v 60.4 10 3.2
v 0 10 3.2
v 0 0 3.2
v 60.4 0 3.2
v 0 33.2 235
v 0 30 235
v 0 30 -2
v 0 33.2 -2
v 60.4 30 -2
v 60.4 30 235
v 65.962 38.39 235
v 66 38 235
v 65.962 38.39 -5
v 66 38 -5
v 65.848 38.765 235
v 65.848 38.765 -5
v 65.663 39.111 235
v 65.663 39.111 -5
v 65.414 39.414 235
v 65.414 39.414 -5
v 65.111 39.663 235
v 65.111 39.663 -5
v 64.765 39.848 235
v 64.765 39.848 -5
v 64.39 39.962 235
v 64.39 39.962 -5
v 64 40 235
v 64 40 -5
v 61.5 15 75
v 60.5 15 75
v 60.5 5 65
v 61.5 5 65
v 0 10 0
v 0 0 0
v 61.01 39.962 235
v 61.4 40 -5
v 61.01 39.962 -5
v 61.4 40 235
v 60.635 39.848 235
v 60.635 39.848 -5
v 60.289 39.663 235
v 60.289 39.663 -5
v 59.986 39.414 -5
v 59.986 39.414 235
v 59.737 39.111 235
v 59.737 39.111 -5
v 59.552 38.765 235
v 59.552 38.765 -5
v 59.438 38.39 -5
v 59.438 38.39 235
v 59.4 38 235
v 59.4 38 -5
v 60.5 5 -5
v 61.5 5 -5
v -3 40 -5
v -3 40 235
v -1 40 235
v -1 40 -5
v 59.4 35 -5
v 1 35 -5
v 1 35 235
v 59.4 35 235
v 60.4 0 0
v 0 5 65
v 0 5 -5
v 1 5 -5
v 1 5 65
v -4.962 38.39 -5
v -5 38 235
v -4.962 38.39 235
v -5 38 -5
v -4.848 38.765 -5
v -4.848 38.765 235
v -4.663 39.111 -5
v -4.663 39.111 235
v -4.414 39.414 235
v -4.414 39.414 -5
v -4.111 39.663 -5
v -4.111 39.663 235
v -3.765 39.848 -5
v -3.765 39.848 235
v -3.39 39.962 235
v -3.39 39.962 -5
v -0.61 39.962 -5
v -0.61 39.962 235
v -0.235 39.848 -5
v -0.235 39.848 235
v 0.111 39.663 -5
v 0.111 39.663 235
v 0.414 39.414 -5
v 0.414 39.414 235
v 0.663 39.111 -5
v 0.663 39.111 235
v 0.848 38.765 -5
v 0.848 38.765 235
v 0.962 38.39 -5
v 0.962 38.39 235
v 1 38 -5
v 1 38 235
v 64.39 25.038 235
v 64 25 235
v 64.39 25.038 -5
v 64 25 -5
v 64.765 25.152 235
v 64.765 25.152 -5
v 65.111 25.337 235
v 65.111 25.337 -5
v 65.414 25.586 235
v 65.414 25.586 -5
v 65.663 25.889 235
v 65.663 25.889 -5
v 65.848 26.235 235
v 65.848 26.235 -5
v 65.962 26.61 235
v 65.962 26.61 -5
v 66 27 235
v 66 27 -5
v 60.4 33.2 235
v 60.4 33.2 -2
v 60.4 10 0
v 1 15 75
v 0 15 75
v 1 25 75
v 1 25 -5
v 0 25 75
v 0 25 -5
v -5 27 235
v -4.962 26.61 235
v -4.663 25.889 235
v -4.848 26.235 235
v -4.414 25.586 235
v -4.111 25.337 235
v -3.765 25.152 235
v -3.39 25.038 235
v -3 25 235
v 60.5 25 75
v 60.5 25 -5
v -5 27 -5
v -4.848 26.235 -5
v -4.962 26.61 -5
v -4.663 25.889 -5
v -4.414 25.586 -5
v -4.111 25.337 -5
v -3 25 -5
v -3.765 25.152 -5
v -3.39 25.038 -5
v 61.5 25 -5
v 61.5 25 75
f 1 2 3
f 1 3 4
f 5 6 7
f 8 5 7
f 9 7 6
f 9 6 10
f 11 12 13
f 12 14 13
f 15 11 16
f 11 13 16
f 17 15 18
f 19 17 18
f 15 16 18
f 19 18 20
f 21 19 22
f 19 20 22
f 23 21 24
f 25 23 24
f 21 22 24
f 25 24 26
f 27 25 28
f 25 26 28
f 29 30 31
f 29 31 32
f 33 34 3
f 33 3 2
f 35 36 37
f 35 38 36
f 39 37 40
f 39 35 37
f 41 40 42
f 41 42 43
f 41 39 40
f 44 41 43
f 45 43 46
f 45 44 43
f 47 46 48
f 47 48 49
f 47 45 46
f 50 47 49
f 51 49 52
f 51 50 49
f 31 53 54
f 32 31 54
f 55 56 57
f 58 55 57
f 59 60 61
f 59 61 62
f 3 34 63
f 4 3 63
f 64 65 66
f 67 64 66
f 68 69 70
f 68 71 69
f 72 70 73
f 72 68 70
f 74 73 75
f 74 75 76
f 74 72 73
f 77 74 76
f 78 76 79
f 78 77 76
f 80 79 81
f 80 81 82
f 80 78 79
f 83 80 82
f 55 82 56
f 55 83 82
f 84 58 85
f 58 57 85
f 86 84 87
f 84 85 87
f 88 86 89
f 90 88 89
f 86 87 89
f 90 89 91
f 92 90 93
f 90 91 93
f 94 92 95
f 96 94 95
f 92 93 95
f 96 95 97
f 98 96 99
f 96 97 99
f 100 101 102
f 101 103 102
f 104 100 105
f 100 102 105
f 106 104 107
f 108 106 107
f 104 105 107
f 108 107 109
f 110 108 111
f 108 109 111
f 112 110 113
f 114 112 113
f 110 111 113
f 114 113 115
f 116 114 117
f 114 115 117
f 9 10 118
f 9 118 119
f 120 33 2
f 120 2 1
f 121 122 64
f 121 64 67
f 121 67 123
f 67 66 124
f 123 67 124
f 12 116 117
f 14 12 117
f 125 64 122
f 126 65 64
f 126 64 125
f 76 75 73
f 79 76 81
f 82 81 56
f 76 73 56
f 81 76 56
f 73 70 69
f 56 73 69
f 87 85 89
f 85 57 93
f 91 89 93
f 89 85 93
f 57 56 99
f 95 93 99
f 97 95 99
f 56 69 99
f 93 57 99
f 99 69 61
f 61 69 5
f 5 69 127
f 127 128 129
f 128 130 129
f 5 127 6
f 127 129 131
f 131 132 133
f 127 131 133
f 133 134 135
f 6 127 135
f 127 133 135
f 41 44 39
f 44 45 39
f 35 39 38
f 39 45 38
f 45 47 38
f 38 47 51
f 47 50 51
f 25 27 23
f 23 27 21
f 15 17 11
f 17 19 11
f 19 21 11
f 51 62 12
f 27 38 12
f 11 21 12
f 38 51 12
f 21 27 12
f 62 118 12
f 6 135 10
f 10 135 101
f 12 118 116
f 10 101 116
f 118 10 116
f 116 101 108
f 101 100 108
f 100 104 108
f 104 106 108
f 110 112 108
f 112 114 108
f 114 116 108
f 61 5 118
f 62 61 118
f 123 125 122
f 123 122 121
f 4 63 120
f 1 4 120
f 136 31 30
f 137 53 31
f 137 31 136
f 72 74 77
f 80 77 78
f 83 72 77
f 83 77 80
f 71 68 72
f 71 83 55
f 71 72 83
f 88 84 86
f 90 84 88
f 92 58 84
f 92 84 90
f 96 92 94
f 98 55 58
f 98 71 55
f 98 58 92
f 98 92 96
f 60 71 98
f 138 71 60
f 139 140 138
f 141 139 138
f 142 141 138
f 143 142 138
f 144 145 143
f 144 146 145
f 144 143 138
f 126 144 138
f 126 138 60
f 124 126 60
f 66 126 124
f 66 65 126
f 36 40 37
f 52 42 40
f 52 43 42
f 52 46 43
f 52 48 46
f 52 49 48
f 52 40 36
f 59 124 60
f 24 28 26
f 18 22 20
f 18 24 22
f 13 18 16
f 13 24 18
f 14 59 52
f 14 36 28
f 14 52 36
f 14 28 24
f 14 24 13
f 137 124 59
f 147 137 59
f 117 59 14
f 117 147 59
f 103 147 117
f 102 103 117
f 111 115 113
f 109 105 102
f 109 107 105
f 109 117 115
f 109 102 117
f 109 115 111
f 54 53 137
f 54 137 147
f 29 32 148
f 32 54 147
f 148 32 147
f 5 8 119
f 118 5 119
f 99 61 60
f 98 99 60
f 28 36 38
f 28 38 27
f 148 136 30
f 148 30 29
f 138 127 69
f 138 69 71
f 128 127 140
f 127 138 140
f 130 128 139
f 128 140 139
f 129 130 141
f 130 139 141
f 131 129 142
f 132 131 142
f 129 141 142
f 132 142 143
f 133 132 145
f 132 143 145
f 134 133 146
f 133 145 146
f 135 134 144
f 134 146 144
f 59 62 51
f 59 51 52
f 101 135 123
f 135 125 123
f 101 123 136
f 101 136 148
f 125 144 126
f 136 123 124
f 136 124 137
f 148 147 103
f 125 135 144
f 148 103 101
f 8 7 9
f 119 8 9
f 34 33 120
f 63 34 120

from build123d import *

# Parameters (mm, degrees)
BOX_W                  = 60.4
BOX_H                  = 10
BOX_DEPTH              = 3.2
BOX003_W               = 60.4
BOX003_H               = 250
BOX003_DEPTH           = 3.2
BOX001_W               = 60.4
BOX001_H               = 250
BOX001_DEPTH           = 3.2
BOX004_W               = 58.4
BOX004_H               = 250
BOX004_DEPTH           = 13.2
BOX005_W               = 58.4
BOX005_H               = 250
BOX005_DEPTH           = 13.2
BOX002_W               = 71
BOX002_H               = 240
BOX002_DEPTH           = 15
CUT001_PLACEMENT_ANGLE = 270
BOX006_W               = 1
BOX006_H               = 20
BOX006_DEPTH           = 80
BOX007_W               = 1
BOX007_H               = 20
BOX007_DEPTH           = 80
FILLET_R               = 2
CHAMFER_SIZE           = 10


with BuildPart() as single_magnet:
    # Box → Box (new body)
    with BuildSketch(Plane.XY):
        with Locations((30.2, 5)):
            Rectangle(BOX_W, BOX_H)
    extrude(amount=BOX_DEPTH)


with BuildPart() as f_25_single_magnets001:
    # Box003 → Box003 (new body)
    with BuildSketch(Plane.XY):
        with Locations((30.2, 125)):
            Rectangle(BOX003_W, BOX003_H)
    extrude(amount=BOX003_DEPTH)


with BuildPart() as magnet_cutout:
    # Box001 → Box001 (new body)
    with BuildSketch(Plane(origin=(0, -5, 0), x_dir=(1, 0, 0), z_dir=(0, 0, 1))):
        with Locations((30.2, 125)):
            Rectangle(BOX001_W, BOX001_H)
    extrude(amount=BOX001_DEPTH)

    # Fusion: union 25-Single-Magnets001
    add(f_25_single_magnets001.part)


with BuildPart() as magnet_cutout_1:
    # Fusion placement: moved
    add(magnet_cutout.part.moved(Location((0, -18, 0))))


with BuildPart() as f_25_single_magnets002:
    # Box004 → Box004 (new body)
    with BuildSketch(Plane(origin=(1, 7, 0), x_dir=(1, 0, 0), z_dir=(0, 0, 1))):
        with Locations((29.2, 125)):
            Rectangle(BOX004_W, BOX004_H)
    extrude(amount=BOX004_DEPTH)


with BuildPart() as slide_cutout:
    # Box005 → Box005 (new body)
    with BuildSketch(Plane(origin=(1, -9, 0), x_dir=(1, 0, 0), z_dir=(0, 0, 1))):
        with Locations((29.2, 125)):
            Rectangle(BOX005_W, BOX005_H)
    extrude(amount=BOX005_DEPTH)

    # Fusion001: union 25-Single-Magnets002
    add(f_25_single_magnets002.part)


with BuildPart() as slide_cutout_1:
    # Fusion001 placement: moved
    add(slide_cutout.part.moved(Location((0, 0, 5))))


with BuildPart() as slide_v1:
    # Box002 → Box002 (new body)
    with BuildSketch(Plane(origin=(-5, -5, -5), x_dir=(1, 0, 0), z_dir=(0, 0, 1))):
        with Locations((35.5, 120)):
            Rectangle(BOX002_W, BOX002_H)
    extrude(amount=BOX002_DEPTH)

    # Cut: cut Slide-Cutout
    add(slide_cutout_1.part, mode=Mode.SUBTRACT)

    # Cut001: cut Magnet-Cutout
    add(magnet_cutout_1.part, mode=Mode.SUBTRACT)


with BuildPart() as slide_v1_1:
    # Cut001 placement: moved
    add(slide_v1.part.moved(Location((0, 30, 230))).rotate(Axis((0, 30, 230), (1, 0, 0)), CUT001_PLACEMENT_ANGLE))


with BuildPart() as support:
    # Box006 → Box006 (new body)
    with BuildSketch(Plane(origin=(0, 5, -5), x_dir=(1, 0, 0), z_dir=(0, 0, 1))):
        with Locations((0.5, 10)):
            Rectangle(BOX006_W, BOX006_H)
    extrude(amount=BOX006_DEPTH)


with BuildPart() as chamfer_body:
    # Box007 → Box007 (new body)
    with BuildSketch(Plane(origin=(60.5, 5, -5), x_dir=(1, 0, 0), z_dir=(0, 0, 1))):
        with Locations((0.5, 10)):
            Rectangle(BOX007_W, BOX007_H)
    extrude(amount=BOX007_DEPTH)

    # Fusion002: union Slide-V1, Support
    add(slide_v1_1.part)
    add(support.part)

    # Fillet
    fillet_edges = [chamfer_body.edges().sort_by_distance(p)[0] for p in [
        (-5, 40, 115),
        (-5, 25, 115),
        (1, 40, 109),
        (1, 40, 229),
        (66, 25, 115),
        (66, 40, 115),
        (59.4, 40, 229),
        (59.4, 40, 109),
    ]]
    fillet(fillet_edges, radius=FILLET_R)

    # Chamfer
    chamfer_edges = [chamfer_body.edges().sort_by_distance(p)[0] for p in [
        (0.5, 5, 75),
        (61, 5, 75),
    ]]
    chamfer(chamfer_edges, length=CHAMFER_SIZE)


solid = Compound([single_magnet.part, chamfer_body.part])
